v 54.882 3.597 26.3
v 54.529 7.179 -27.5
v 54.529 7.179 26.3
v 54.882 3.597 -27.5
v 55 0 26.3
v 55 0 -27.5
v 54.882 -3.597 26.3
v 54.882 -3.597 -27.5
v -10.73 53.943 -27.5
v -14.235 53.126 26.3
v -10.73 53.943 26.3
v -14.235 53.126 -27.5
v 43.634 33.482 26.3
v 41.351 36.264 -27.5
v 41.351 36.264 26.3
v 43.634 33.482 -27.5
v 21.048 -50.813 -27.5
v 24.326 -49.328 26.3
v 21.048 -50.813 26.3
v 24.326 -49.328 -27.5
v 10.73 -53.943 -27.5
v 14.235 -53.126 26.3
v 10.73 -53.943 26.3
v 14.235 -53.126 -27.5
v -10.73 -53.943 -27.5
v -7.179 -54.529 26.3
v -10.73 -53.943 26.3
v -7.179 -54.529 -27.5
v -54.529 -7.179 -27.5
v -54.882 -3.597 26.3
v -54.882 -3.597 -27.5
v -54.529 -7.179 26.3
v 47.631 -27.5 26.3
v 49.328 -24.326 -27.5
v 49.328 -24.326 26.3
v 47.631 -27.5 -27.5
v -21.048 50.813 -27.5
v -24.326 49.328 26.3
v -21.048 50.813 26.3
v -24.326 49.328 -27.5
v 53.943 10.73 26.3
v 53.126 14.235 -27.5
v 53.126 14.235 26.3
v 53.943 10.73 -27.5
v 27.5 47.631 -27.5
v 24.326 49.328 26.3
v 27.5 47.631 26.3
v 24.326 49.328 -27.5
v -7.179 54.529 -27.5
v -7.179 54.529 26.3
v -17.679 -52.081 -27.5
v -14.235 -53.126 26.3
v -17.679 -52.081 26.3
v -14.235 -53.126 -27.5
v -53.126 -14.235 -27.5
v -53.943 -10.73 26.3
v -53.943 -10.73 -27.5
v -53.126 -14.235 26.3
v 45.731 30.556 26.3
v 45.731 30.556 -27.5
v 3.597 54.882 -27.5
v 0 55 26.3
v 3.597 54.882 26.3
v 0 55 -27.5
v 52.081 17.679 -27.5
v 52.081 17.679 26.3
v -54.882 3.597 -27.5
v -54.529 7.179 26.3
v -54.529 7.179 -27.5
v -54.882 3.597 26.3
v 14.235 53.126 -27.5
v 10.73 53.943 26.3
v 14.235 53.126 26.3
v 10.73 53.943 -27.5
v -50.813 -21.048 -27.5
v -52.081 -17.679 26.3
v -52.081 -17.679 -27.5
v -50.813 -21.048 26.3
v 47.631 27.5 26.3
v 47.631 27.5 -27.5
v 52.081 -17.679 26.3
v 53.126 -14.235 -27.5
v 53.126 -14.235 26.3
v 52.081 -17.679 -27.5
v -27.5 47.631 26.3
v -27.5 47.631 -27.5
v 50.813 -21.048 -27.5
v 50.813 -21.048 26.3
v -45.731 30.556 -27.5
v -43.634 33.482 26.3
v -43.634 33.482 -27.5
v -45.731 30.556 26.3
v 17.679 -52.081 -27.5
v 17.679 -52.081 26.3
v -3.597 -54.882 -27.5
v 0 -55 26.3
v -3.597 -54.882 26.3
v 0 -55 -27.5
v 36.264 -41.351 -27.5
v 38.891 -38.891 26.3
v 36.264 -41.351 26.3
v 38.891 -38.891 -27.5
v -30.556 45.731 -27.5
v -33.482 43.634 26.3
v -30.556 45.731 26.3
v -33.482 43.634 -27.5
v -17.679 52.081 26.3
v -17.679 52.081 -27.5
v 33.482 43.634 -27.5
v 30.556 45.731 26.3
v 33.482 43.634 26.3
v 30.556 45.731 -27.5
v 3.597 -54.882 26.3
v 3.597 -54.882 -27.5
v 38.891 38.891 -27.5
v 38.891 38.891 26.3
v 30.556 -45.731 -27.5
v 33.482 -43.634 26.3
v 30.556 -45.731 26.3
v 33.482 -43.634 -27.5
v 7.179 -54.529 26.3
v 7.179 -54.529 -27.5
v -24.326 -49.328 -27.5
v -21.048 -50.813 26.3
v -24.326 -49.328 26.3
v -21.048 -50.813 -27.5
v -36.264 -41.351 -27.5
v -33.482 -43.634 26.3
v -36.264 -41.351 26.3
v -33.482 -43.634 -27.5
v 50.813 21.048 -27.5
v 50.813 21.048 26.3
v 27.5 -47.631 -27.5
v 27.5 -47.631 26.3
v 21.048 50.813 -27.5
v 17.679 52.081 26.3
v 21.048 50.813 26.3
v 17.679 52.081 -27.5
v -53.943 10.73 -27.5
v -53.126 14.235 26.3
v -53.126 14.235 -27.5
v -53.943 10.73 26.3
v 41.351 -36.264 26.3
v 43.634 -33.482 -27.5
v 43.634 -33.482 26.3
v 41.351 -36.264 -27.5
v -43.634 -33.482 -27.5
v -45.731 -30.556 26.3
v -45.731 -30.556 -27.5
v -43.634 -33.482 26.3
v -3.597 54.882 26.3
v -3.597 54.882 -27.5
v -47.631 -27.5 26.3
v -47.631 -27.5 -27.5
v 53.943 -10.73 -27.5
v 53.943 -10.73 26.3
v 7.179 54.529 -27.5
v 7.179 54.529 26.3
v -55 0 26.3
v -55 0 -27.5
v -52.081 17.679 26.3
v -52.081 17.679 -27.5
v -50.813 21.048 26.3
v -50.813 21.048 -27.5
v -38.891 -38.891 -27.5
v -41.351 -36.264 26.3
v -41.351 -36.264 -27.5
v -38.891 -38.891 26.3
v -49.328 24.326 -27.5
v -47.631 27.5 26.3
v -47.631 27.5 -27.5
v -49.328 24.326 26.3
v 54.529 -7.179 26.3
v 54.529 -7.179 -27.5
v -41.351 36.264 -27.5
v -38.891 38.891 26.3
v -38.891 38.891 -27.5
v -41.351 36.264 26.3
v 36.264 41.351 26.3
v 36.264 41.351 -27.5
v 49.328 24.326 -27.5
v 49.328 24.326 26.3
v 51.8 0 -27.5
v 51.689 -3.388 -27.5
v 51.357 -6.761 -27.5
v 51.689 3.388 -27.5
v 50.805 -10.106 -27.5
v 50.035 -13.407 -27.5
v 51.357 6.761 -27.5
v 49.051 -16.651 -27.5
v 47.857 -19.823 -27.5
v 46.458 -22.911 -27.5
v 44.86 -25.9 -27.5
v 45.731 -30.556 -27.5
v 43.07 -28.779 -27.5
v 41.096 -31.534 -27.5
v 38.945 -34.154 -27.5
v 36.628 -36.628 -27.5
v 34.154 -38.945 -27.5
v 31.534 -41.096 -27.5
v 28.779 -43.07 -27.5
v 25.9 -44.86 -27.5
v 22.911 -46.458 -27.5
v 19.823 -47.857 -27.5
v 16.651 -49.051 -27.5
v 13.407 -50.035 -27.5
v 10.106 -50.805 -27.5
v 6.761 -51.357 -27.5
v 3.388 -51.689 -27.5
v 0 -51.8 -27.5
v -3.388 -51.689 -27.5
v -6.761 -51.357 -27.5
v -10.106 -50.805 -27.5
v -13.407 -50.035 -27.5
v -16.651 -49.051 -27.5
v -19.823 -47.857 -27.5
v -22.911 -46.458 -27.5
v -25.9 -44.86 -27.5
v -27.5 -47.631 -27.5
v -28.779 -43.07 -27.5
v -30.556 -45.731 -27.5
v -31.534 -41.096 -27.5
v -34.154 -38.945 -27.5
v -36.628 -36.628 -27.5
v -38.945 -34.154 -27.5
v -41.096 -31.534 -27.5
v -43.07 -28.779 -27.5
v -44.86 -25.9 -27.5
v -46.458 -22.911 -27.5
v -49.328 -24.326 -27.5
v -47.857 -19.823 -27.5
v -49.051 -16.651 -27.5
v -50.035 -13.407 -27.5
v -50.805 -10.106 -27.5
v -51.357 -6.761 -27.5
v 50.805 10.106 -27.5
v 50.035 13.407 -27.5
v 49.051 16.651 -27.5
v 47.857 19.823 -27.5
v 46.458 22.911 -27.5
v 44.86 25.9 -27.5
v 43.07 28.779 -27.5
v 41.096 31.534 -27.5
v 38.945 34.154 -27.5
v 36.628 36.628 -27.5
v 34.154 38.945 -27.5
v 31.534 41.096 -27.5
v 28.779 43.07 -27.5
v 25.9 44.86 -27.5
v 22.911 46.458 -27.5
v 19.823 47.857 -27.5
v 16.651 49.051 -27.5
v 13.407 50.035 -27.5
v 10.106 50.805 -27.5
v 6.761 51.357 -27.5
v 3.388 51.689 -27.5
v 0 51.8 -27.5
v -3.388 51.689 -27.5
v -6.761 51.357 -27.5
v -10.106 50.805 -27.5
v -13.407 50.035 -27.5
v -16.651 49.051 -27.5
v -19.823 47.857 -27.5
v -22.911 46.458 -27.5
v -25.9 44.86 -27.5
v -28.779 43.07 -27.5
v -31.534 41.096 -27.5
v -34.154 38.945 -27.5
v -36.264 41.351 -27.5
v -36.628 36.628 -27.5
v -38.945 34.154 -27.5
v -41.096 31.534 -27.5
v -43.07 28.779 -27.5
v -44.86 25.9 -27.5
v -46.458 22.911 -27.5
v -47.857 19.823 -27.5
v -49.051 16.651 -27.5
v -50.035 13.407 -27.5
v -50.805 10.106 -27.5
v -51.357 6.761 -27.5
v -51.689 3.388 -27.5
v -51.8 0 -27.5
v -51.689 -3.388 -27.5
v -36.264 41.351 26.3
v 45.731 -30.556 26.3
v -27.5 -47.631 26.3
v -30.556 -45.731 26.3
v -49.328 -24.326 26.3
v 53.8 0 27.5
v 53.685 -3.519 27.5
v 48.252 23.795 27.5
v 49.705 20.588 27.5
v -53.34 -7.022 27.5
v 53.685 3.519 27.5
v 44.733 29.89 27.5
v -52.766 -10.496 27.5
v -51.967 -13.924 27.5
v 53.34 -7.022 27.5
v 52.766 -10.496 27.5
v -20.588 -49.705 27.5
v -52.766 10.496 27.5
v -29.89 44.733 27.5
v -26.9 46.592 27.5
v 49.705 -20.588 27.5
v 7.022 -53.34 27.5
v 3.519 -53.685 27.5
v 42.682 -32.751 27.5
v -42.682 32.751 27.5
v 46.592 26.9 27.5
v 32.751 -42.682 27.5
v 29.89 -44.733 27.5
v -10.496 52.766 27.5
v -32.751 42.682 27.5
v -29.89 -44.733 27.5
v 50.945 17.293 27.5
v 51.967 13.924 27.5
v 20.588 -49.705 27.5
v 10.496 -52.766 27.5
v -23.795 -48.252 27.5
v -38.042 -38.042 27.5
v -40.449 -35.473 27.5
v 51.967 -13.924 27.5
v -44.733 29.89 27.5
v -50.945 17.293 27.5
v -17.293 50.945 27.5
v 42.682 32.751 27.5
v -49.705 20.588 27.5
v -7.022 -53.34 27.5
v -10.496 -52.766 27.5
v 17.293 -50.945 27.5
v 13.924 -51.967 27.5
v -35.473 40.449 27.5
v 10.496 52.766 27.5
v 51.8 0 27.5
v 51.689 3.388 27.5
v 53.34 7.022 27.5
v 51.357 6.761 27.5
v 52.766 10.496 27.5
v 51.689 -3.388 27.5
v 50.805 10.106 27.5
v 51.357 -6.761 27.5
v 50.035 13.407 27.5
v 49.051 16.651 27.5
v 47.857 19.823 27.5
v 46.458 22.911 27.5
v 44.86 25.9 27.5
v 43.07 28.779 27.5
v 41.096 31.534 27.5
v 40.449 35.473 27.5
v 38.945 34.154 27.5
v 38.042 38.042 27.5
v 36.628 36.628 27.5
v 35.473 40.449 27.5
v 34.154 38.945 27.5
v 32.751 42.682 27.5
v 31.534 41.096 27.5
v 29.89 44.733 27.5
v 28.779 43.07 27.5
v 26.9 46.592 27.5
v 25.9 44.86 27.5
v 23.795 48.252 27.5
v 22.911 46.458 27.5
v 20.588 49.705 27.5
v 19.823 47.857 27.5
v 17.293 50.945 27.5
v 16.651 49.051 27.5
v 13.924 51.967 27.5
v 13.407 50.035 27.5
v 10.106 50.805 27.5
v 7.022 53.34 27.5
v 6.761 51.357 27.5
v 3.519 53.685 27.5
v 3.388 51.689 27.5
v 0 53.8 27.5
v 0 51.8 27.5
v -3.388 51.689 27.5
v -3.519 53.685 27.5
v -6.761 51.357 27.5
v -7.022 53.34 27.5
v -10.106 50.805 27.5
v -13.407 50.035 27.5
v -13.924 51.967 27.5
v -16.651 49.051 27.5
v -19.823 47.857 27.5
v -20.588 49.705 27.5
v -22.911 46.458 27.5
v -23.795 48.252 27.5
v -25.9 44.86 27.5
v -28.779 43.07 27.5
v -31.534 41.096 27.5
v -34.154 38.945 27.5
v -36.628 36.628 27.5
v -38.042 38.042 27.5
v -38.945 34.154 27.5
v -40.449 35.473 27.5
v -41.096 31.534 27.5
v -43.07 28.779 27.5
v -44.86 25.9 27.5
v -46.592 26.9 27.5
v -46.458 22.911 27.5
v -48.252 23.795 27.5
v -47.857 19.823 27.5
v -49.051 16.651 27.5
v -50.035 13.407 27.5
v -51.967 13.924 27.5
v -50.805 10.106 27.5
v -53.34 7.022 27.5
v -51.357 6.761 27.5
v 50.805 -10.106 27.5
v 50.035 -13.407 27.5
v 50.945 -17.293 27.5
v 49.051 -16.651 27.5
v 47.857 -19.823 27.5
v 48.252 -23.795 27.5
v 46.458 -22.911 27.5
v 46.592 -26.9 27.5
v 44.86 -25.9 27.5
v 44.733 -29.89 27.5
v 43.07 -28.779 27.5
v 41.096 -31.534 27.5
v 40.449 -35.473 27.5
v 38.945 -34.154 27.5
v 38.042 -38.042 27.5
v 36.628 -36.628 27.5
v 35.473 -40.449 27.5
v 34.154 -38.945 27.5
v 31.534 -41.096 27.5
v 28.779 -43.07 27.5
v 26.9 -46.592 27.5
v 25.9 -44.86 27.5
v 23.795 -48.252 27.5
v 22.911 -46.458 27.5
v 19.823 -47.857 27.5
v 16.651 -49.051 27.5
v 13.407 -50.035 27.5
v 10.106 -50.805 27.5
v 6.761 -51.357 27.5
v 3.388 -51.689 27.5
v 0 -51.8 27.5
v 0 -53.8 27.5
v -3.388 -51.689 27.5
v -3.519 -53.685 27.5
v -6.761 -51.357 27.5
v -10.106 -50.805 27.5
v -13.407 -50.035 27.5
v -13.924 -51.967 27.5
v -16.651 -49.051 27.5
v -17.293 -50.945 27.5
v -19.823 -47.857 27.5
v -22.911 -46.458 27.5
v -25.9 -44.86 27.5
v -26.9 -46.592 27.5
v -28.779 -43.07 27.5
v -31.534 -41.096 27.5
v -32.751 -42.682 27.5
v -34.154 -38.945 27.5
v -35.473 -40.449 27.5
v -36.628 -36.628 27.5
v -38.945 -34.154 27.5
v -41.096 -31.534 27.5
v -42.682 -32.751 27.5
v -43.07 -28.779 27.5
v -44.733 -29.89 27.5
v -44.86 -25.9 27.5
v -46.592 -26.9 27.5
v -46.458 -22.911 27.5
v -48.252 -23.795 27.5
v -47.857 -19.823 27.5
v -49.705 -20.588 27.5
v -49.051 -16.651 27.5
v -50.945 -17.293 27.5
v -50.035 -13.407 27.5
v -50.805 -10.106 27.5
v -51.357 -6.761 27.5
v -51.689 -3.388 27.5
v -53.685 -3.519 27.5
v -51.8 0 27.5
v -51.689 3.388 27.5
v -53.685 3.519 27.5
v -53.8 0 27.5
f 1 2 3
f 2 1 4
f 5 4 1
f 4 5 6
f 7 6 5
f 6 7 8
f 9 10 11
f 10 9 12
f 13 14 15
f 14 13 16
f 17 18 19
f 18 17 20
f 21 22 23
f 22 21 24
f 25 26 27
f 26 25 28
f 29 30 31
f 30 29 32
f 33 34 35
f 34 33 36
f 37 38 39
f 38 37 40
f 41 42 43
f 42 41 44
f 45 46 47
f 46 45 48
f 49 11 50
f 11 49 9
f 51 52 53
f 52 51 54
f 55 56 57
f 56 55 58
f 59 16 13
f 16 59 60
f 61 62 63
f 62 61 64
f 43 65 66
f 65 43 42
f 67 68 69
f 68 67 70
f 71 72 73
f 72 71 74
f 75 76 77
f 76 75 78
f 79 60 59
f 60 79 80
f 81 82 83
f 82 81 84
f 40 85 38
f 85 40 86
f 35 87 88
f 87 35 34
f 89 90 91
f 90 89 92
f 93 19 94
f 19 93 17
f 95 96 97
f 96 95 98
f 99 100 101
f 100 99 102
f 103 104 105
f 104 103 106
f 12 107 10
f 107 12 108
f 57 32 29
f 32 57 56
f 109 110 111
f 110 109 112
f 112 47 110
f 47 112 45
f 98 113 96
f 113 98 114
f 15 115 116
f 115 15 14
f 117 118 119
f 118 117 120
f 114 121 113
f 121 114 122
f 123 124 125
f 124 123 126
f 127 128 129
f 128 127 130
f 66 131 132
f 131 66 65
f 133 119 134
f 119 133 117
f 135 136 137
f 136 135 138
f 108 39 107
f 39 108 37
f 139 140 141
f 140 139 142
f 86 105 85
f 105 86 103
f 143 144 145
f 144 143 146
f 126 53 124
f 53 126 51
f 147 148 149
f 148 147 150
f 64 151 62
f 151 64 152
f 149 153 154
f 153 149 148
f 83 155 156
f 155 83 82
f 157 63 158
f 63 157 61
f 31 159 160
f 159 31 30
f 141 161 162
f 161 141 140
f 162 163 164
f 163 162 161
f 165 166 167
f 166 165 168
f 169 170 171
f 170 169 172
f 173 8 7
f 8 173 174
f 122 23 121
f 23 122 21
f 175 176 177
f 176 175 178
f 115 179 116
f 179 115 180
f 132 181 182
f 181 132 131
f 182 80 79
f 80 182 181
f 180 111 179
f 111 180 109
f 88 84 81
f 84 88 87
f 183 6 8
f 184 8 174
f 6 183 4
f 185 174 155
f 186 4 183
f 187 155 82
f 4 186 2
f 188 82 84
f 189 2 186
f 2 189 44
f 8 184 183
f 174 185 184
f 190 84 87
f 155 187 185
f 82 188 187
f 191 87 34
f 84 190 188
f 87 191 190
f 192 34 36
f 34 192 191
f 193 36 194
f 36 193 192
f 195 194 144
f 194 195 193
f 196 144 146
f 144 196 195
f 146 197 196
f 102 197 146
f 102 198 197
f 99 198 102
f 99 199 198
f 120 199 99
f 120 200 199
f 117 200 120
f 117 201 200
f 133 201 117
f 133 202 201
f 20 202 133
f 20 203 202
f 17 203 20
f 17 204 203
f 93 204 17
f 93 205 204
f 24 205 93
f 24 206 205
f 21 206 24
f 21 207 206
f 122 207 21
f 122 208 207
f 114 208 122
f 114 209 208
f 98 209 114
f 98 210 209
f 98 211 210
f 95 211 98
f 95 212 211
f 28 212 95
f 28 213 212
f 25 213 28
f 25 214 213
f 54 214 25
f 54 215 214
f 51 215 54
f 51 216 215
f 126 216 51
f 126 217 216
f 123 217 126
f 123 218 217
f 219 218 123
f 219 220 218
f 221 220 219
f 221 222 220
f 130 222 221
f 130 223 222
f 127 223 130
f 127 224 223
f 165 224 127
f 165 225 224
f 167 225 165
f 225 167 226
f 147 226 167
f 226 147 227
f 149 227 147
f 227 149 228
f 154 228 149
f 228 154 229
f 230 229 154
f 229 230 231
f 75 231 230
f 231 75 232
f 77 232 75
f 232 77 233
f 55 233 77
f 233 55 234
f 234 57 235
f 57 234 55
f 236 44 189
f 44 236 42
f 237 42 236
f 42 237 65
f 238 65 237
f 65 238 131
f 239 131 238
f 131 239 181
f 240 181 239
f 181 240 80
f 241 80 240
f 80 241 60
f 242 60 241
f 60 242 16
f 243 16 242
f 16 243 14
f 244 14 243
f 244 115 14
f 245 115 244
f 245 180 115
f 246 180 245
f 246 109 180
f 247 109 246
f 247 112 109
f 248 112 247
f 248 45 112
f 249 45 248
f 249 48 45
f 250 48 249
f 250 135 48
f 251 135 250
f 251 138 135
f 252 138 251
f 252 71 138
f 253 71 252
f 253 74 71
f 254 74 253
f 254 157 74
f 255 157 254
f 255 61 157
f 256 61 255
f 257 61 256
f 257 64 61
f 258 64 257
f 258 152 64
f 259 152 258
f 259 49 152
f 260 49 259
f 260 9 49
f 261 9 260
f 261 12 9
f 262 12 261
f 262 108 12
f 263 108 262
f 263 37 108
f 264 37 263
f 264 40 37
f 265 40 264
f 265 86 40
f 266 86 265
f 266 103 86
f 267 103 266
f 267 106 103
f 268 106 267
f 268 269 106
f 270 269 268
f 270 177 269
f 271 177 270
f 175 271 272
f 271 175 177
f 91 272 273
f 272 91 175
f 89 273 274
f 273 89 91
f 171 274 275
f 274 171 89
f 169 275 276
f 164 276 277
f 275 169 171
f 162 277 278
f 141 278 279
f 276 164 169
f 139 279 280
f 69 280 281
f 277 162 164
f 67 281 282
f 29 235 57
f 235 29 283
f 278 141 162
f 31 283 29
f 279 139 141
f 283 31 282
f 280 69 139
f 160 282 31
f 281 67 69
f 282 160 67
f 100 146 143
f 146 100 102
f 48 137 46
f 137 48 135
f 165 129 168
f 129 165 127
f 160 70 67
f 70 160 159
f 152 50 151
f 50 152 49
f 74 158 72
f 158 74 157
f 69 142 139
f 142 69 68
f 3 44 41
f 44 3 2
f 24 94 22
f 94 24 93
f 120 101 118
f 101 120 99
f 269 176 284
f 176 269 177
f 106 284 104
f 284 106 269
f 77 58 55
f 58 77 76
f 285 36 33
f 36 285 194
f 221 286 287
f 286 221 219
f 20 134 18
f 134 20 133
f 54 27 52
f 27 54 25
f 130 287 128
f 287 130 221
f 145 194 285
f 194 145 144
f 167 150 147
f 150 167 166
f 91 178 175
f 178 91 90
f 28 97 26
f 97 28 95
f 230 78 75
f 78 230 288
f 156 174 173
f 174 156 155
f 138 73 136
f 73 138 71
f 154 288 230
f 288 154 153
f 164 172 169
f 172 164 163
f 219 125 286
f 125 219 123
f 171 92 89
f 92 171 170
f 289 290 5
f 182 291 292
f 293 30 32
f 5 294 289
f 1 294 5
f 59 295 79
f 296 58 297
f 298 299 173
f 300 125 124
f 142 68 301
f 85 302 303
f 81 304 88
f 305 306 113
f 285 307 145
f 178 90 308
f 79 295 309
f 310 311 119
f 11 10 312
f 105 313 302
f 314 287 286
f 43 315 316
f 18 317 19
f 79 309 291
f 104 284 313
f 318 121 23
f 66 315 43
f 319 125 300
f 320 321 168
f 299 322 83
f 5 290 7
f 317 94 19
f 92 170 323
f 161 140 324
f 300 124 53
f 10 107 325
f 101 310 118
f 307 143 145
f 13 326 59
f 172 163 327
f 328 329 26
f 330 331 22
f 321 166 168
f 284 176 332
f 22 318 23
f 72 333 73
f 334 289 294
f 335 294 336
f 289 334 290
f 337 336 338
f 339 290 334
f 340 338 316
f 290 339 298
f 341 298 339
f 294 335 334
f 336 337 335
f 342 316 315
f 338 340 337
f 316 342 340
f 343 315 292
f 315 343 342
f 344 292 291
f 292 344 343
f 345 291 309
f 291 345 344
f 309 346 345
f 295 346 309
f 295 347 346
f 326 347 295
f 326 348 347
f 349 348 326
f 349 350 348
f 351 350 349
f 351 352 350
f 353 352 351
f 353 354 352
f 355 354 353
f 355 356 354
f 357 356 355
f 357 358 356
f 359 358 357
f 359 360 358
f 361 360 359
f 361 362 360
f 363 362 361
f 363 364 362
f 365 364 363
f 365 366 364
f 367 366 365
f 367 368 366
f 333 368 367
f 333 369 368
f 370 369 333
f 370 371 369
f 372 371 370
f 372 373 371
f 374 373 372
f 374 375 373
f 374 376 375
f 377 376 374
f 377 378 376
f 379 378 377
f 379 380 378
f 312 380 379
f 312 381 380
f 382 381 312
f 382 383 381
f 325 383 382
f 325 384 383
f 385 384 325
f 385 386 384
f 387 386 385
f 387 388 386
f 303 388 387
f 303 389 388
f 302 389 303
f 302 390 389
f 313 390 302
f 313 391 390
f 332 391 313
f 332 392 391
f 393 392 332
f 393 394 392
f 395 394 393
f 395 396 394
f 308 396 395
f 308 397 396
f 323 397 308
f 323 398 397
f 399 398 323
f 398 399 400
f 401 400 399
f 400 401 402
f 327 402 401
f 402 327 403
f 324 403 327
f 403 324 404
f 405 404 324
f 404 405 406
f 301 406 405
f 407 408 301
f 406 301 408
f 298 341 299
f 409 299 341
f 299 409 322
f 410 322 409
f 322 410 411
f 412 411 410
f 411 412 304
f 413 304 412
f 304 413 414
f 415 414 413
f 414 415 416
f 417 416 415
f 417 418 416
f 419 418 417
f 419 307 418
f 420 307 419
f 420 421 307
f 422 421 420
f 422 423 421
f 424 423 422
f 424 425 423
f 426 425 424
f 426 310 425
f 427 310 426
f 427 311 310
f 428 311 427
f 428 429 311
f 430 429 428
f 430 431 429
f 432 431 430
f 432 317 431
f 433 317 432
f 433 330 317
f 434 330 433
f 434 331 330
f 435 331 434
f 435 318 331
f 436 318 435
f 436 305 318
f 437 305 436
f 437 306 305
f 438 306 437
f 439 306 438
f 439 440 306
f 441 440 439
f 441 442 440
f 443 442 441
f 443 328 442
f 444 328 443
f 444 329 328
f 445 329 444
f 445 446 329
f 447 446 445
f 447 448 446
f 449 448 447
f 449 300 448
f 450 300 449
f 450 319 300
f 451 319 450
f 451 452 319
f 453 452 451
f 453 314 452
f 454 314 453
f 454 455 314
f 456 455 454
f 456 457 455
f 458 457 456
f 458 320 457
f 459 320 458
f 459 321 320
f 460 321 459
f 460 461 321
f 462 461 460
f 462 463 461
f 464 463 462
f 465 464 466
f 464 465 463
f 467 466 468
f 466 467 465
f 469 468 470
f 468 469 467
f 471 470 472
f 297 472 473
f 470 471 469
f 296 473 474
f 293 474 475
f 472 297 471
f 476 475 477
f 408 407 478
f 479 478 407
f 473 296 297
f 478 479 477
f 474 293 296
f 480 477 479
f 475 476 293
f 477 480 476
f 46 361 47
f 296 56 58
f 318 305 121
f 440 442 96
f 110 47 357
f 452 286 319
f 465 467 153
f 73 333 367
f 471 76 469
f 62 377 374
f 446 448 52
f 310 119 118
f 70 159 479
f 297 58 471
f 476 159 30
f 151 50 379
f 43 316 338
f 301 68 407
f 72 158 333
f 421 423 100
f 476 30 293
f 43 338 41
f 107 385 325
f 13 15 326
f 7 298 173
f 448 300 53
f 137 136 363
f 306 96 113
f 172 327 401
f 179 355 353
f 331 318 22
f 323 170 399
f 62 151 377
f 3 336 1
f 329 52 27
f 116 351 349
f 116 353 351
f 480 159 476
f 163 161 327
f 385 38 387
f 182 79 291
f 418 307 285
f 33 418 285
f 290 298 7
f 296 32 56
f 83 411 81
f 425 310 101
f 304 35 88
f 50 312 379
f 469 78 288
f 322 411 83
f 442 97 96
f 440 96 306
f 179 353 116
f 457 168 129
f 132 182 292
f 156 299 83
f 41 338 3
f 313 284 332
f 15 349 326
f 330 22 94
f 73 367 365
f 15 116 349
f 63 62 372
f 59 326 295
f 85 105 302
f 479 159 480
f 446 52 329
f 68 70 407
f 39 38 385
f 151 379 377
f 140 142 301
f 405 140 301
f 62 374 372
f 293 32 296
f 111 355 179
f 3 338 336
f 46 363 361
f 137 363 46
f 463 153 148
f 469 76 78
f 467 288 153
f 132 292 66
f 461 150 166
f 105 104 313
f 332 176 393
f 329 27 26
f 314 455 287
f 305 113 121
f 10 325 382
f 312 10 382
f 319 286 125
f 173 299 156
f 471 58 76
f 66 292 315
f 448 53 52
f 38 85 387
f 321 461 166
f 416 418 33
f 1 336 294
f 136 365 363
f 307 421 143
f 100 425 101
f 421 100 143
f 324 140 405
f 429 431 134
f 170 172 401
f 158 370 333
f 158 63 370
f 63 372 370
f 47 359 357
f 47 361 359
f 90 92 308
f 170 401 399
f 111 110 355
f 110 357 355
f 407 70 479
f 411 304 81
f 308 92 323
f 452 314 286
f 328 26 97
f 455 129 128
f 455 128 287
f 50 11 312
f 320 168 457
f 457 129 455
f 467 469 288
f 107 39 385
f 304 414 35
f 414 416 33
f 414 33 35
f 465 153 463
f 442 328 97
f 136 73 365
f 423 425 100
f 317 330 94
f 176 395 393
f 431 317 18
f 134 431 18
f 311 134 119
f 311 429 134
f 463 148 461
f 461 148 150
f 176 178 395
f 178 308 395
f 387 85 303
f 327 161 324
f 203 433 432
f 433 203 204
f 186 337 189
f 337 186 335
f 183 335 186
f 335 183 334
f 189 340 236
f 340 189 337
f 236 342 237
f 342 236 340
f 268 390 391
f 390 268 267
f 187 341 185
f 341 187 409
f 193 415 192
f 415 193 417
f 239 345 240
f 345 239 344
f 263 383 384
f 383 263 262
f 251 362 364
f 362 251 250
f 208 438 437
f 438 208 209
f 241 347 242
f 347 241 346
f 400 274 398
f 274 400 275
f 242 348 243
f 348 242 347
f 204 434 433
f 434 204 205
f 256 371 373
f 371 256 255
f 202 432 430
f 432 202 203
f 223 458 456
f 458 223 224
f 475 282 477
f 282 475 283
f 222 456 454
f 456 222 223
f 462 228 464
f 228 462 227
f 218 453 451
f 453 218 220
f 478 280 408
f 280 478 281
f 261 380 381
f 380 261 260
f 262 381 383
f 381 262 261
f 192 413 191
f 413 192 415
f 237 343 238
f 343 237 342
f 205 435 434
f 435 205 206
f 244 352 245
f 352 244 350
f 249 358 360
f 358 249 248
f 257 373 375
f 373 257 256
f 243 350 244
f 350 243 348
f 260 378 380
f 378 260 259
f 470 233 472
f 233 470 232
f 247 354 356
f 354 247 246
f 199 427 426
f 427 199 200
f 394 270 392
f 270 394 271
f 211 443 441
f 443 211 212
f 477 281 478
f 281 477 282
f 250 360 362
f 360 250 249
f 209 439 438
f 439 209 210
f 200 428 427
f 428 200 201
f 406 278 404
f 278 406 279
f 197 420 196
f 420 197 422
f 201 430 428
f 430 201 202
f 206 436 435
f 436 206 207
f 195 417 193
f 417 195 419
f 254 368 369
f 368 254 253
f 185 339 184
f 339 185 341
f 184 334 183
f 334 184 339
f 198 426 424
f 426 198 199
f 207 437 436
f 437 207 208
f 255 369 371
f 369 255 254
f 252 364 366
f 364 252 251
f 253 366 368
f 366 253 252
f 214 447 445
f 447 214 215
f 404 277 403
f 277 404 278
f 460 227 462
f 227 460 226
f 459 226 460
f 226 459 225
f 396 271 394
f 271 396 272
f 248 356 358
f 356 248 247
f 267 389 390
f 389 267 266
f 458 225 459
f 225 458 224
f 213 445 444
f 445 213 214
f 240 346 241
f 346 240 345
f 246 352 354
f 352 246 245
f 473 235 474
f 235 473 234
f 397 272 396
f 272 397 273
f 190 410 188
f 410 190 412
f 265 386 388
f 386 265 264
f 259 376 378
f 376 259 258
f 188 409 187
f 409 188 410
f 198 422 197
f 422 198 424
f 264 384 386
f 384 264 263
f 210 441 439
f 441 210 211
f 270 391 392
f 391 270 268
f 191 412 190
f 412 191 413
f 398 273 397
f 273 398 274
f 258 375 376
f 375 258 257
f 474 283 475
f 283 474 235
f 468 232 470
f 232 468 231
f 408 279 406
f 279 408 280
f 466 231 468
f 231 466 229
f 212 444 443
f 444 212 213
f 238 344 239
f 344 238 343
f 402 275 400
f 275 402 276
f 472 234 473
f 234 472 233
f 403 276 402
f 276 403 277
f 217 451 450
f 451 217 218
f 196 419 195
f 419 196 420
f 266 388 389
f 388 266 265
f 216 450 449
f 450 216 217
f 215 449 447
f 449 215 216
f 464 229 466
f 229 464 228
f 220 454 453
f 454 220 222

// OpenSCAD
$fn=96;

module ht110_cap(
    od=110,
    wall=3.2,
    height=55,
    top_thickness=4,
    lip_height=22,
    lip_thickness=2.2,
    chamfer=1.2
){
    id = od - 2*wall;
    outer_r = od/2;
    inner_r = id/2;

    module chamfered_cyl(r, h, c){
        union(){
            cylinder(r=r, h=h-c);
            translate([0,0,h-c]) cylinder(r1=r, r2=max(r-c,0.01), h=c);
        }
    }

    difference(){
        union(){
            chamfered_cyl(outer_r, height, chamfer);

            translate([0,0,top_thickness])
                difference(){
                    cylinder(r=inner_r + lip_thickness, h=lip_height);
                    cylinder(r=inner_r, h=lip_height);
                }
        }

        translate([0,0,top_thickness])
            chamfered_cyl(inner_r, height, chamfer);

        translate([0,0,-0.2])
            cylinder(r=inner_r, h=top_thickness+0.4);
    }
}

translate([0,0,-55/2]) ht110_cap();
